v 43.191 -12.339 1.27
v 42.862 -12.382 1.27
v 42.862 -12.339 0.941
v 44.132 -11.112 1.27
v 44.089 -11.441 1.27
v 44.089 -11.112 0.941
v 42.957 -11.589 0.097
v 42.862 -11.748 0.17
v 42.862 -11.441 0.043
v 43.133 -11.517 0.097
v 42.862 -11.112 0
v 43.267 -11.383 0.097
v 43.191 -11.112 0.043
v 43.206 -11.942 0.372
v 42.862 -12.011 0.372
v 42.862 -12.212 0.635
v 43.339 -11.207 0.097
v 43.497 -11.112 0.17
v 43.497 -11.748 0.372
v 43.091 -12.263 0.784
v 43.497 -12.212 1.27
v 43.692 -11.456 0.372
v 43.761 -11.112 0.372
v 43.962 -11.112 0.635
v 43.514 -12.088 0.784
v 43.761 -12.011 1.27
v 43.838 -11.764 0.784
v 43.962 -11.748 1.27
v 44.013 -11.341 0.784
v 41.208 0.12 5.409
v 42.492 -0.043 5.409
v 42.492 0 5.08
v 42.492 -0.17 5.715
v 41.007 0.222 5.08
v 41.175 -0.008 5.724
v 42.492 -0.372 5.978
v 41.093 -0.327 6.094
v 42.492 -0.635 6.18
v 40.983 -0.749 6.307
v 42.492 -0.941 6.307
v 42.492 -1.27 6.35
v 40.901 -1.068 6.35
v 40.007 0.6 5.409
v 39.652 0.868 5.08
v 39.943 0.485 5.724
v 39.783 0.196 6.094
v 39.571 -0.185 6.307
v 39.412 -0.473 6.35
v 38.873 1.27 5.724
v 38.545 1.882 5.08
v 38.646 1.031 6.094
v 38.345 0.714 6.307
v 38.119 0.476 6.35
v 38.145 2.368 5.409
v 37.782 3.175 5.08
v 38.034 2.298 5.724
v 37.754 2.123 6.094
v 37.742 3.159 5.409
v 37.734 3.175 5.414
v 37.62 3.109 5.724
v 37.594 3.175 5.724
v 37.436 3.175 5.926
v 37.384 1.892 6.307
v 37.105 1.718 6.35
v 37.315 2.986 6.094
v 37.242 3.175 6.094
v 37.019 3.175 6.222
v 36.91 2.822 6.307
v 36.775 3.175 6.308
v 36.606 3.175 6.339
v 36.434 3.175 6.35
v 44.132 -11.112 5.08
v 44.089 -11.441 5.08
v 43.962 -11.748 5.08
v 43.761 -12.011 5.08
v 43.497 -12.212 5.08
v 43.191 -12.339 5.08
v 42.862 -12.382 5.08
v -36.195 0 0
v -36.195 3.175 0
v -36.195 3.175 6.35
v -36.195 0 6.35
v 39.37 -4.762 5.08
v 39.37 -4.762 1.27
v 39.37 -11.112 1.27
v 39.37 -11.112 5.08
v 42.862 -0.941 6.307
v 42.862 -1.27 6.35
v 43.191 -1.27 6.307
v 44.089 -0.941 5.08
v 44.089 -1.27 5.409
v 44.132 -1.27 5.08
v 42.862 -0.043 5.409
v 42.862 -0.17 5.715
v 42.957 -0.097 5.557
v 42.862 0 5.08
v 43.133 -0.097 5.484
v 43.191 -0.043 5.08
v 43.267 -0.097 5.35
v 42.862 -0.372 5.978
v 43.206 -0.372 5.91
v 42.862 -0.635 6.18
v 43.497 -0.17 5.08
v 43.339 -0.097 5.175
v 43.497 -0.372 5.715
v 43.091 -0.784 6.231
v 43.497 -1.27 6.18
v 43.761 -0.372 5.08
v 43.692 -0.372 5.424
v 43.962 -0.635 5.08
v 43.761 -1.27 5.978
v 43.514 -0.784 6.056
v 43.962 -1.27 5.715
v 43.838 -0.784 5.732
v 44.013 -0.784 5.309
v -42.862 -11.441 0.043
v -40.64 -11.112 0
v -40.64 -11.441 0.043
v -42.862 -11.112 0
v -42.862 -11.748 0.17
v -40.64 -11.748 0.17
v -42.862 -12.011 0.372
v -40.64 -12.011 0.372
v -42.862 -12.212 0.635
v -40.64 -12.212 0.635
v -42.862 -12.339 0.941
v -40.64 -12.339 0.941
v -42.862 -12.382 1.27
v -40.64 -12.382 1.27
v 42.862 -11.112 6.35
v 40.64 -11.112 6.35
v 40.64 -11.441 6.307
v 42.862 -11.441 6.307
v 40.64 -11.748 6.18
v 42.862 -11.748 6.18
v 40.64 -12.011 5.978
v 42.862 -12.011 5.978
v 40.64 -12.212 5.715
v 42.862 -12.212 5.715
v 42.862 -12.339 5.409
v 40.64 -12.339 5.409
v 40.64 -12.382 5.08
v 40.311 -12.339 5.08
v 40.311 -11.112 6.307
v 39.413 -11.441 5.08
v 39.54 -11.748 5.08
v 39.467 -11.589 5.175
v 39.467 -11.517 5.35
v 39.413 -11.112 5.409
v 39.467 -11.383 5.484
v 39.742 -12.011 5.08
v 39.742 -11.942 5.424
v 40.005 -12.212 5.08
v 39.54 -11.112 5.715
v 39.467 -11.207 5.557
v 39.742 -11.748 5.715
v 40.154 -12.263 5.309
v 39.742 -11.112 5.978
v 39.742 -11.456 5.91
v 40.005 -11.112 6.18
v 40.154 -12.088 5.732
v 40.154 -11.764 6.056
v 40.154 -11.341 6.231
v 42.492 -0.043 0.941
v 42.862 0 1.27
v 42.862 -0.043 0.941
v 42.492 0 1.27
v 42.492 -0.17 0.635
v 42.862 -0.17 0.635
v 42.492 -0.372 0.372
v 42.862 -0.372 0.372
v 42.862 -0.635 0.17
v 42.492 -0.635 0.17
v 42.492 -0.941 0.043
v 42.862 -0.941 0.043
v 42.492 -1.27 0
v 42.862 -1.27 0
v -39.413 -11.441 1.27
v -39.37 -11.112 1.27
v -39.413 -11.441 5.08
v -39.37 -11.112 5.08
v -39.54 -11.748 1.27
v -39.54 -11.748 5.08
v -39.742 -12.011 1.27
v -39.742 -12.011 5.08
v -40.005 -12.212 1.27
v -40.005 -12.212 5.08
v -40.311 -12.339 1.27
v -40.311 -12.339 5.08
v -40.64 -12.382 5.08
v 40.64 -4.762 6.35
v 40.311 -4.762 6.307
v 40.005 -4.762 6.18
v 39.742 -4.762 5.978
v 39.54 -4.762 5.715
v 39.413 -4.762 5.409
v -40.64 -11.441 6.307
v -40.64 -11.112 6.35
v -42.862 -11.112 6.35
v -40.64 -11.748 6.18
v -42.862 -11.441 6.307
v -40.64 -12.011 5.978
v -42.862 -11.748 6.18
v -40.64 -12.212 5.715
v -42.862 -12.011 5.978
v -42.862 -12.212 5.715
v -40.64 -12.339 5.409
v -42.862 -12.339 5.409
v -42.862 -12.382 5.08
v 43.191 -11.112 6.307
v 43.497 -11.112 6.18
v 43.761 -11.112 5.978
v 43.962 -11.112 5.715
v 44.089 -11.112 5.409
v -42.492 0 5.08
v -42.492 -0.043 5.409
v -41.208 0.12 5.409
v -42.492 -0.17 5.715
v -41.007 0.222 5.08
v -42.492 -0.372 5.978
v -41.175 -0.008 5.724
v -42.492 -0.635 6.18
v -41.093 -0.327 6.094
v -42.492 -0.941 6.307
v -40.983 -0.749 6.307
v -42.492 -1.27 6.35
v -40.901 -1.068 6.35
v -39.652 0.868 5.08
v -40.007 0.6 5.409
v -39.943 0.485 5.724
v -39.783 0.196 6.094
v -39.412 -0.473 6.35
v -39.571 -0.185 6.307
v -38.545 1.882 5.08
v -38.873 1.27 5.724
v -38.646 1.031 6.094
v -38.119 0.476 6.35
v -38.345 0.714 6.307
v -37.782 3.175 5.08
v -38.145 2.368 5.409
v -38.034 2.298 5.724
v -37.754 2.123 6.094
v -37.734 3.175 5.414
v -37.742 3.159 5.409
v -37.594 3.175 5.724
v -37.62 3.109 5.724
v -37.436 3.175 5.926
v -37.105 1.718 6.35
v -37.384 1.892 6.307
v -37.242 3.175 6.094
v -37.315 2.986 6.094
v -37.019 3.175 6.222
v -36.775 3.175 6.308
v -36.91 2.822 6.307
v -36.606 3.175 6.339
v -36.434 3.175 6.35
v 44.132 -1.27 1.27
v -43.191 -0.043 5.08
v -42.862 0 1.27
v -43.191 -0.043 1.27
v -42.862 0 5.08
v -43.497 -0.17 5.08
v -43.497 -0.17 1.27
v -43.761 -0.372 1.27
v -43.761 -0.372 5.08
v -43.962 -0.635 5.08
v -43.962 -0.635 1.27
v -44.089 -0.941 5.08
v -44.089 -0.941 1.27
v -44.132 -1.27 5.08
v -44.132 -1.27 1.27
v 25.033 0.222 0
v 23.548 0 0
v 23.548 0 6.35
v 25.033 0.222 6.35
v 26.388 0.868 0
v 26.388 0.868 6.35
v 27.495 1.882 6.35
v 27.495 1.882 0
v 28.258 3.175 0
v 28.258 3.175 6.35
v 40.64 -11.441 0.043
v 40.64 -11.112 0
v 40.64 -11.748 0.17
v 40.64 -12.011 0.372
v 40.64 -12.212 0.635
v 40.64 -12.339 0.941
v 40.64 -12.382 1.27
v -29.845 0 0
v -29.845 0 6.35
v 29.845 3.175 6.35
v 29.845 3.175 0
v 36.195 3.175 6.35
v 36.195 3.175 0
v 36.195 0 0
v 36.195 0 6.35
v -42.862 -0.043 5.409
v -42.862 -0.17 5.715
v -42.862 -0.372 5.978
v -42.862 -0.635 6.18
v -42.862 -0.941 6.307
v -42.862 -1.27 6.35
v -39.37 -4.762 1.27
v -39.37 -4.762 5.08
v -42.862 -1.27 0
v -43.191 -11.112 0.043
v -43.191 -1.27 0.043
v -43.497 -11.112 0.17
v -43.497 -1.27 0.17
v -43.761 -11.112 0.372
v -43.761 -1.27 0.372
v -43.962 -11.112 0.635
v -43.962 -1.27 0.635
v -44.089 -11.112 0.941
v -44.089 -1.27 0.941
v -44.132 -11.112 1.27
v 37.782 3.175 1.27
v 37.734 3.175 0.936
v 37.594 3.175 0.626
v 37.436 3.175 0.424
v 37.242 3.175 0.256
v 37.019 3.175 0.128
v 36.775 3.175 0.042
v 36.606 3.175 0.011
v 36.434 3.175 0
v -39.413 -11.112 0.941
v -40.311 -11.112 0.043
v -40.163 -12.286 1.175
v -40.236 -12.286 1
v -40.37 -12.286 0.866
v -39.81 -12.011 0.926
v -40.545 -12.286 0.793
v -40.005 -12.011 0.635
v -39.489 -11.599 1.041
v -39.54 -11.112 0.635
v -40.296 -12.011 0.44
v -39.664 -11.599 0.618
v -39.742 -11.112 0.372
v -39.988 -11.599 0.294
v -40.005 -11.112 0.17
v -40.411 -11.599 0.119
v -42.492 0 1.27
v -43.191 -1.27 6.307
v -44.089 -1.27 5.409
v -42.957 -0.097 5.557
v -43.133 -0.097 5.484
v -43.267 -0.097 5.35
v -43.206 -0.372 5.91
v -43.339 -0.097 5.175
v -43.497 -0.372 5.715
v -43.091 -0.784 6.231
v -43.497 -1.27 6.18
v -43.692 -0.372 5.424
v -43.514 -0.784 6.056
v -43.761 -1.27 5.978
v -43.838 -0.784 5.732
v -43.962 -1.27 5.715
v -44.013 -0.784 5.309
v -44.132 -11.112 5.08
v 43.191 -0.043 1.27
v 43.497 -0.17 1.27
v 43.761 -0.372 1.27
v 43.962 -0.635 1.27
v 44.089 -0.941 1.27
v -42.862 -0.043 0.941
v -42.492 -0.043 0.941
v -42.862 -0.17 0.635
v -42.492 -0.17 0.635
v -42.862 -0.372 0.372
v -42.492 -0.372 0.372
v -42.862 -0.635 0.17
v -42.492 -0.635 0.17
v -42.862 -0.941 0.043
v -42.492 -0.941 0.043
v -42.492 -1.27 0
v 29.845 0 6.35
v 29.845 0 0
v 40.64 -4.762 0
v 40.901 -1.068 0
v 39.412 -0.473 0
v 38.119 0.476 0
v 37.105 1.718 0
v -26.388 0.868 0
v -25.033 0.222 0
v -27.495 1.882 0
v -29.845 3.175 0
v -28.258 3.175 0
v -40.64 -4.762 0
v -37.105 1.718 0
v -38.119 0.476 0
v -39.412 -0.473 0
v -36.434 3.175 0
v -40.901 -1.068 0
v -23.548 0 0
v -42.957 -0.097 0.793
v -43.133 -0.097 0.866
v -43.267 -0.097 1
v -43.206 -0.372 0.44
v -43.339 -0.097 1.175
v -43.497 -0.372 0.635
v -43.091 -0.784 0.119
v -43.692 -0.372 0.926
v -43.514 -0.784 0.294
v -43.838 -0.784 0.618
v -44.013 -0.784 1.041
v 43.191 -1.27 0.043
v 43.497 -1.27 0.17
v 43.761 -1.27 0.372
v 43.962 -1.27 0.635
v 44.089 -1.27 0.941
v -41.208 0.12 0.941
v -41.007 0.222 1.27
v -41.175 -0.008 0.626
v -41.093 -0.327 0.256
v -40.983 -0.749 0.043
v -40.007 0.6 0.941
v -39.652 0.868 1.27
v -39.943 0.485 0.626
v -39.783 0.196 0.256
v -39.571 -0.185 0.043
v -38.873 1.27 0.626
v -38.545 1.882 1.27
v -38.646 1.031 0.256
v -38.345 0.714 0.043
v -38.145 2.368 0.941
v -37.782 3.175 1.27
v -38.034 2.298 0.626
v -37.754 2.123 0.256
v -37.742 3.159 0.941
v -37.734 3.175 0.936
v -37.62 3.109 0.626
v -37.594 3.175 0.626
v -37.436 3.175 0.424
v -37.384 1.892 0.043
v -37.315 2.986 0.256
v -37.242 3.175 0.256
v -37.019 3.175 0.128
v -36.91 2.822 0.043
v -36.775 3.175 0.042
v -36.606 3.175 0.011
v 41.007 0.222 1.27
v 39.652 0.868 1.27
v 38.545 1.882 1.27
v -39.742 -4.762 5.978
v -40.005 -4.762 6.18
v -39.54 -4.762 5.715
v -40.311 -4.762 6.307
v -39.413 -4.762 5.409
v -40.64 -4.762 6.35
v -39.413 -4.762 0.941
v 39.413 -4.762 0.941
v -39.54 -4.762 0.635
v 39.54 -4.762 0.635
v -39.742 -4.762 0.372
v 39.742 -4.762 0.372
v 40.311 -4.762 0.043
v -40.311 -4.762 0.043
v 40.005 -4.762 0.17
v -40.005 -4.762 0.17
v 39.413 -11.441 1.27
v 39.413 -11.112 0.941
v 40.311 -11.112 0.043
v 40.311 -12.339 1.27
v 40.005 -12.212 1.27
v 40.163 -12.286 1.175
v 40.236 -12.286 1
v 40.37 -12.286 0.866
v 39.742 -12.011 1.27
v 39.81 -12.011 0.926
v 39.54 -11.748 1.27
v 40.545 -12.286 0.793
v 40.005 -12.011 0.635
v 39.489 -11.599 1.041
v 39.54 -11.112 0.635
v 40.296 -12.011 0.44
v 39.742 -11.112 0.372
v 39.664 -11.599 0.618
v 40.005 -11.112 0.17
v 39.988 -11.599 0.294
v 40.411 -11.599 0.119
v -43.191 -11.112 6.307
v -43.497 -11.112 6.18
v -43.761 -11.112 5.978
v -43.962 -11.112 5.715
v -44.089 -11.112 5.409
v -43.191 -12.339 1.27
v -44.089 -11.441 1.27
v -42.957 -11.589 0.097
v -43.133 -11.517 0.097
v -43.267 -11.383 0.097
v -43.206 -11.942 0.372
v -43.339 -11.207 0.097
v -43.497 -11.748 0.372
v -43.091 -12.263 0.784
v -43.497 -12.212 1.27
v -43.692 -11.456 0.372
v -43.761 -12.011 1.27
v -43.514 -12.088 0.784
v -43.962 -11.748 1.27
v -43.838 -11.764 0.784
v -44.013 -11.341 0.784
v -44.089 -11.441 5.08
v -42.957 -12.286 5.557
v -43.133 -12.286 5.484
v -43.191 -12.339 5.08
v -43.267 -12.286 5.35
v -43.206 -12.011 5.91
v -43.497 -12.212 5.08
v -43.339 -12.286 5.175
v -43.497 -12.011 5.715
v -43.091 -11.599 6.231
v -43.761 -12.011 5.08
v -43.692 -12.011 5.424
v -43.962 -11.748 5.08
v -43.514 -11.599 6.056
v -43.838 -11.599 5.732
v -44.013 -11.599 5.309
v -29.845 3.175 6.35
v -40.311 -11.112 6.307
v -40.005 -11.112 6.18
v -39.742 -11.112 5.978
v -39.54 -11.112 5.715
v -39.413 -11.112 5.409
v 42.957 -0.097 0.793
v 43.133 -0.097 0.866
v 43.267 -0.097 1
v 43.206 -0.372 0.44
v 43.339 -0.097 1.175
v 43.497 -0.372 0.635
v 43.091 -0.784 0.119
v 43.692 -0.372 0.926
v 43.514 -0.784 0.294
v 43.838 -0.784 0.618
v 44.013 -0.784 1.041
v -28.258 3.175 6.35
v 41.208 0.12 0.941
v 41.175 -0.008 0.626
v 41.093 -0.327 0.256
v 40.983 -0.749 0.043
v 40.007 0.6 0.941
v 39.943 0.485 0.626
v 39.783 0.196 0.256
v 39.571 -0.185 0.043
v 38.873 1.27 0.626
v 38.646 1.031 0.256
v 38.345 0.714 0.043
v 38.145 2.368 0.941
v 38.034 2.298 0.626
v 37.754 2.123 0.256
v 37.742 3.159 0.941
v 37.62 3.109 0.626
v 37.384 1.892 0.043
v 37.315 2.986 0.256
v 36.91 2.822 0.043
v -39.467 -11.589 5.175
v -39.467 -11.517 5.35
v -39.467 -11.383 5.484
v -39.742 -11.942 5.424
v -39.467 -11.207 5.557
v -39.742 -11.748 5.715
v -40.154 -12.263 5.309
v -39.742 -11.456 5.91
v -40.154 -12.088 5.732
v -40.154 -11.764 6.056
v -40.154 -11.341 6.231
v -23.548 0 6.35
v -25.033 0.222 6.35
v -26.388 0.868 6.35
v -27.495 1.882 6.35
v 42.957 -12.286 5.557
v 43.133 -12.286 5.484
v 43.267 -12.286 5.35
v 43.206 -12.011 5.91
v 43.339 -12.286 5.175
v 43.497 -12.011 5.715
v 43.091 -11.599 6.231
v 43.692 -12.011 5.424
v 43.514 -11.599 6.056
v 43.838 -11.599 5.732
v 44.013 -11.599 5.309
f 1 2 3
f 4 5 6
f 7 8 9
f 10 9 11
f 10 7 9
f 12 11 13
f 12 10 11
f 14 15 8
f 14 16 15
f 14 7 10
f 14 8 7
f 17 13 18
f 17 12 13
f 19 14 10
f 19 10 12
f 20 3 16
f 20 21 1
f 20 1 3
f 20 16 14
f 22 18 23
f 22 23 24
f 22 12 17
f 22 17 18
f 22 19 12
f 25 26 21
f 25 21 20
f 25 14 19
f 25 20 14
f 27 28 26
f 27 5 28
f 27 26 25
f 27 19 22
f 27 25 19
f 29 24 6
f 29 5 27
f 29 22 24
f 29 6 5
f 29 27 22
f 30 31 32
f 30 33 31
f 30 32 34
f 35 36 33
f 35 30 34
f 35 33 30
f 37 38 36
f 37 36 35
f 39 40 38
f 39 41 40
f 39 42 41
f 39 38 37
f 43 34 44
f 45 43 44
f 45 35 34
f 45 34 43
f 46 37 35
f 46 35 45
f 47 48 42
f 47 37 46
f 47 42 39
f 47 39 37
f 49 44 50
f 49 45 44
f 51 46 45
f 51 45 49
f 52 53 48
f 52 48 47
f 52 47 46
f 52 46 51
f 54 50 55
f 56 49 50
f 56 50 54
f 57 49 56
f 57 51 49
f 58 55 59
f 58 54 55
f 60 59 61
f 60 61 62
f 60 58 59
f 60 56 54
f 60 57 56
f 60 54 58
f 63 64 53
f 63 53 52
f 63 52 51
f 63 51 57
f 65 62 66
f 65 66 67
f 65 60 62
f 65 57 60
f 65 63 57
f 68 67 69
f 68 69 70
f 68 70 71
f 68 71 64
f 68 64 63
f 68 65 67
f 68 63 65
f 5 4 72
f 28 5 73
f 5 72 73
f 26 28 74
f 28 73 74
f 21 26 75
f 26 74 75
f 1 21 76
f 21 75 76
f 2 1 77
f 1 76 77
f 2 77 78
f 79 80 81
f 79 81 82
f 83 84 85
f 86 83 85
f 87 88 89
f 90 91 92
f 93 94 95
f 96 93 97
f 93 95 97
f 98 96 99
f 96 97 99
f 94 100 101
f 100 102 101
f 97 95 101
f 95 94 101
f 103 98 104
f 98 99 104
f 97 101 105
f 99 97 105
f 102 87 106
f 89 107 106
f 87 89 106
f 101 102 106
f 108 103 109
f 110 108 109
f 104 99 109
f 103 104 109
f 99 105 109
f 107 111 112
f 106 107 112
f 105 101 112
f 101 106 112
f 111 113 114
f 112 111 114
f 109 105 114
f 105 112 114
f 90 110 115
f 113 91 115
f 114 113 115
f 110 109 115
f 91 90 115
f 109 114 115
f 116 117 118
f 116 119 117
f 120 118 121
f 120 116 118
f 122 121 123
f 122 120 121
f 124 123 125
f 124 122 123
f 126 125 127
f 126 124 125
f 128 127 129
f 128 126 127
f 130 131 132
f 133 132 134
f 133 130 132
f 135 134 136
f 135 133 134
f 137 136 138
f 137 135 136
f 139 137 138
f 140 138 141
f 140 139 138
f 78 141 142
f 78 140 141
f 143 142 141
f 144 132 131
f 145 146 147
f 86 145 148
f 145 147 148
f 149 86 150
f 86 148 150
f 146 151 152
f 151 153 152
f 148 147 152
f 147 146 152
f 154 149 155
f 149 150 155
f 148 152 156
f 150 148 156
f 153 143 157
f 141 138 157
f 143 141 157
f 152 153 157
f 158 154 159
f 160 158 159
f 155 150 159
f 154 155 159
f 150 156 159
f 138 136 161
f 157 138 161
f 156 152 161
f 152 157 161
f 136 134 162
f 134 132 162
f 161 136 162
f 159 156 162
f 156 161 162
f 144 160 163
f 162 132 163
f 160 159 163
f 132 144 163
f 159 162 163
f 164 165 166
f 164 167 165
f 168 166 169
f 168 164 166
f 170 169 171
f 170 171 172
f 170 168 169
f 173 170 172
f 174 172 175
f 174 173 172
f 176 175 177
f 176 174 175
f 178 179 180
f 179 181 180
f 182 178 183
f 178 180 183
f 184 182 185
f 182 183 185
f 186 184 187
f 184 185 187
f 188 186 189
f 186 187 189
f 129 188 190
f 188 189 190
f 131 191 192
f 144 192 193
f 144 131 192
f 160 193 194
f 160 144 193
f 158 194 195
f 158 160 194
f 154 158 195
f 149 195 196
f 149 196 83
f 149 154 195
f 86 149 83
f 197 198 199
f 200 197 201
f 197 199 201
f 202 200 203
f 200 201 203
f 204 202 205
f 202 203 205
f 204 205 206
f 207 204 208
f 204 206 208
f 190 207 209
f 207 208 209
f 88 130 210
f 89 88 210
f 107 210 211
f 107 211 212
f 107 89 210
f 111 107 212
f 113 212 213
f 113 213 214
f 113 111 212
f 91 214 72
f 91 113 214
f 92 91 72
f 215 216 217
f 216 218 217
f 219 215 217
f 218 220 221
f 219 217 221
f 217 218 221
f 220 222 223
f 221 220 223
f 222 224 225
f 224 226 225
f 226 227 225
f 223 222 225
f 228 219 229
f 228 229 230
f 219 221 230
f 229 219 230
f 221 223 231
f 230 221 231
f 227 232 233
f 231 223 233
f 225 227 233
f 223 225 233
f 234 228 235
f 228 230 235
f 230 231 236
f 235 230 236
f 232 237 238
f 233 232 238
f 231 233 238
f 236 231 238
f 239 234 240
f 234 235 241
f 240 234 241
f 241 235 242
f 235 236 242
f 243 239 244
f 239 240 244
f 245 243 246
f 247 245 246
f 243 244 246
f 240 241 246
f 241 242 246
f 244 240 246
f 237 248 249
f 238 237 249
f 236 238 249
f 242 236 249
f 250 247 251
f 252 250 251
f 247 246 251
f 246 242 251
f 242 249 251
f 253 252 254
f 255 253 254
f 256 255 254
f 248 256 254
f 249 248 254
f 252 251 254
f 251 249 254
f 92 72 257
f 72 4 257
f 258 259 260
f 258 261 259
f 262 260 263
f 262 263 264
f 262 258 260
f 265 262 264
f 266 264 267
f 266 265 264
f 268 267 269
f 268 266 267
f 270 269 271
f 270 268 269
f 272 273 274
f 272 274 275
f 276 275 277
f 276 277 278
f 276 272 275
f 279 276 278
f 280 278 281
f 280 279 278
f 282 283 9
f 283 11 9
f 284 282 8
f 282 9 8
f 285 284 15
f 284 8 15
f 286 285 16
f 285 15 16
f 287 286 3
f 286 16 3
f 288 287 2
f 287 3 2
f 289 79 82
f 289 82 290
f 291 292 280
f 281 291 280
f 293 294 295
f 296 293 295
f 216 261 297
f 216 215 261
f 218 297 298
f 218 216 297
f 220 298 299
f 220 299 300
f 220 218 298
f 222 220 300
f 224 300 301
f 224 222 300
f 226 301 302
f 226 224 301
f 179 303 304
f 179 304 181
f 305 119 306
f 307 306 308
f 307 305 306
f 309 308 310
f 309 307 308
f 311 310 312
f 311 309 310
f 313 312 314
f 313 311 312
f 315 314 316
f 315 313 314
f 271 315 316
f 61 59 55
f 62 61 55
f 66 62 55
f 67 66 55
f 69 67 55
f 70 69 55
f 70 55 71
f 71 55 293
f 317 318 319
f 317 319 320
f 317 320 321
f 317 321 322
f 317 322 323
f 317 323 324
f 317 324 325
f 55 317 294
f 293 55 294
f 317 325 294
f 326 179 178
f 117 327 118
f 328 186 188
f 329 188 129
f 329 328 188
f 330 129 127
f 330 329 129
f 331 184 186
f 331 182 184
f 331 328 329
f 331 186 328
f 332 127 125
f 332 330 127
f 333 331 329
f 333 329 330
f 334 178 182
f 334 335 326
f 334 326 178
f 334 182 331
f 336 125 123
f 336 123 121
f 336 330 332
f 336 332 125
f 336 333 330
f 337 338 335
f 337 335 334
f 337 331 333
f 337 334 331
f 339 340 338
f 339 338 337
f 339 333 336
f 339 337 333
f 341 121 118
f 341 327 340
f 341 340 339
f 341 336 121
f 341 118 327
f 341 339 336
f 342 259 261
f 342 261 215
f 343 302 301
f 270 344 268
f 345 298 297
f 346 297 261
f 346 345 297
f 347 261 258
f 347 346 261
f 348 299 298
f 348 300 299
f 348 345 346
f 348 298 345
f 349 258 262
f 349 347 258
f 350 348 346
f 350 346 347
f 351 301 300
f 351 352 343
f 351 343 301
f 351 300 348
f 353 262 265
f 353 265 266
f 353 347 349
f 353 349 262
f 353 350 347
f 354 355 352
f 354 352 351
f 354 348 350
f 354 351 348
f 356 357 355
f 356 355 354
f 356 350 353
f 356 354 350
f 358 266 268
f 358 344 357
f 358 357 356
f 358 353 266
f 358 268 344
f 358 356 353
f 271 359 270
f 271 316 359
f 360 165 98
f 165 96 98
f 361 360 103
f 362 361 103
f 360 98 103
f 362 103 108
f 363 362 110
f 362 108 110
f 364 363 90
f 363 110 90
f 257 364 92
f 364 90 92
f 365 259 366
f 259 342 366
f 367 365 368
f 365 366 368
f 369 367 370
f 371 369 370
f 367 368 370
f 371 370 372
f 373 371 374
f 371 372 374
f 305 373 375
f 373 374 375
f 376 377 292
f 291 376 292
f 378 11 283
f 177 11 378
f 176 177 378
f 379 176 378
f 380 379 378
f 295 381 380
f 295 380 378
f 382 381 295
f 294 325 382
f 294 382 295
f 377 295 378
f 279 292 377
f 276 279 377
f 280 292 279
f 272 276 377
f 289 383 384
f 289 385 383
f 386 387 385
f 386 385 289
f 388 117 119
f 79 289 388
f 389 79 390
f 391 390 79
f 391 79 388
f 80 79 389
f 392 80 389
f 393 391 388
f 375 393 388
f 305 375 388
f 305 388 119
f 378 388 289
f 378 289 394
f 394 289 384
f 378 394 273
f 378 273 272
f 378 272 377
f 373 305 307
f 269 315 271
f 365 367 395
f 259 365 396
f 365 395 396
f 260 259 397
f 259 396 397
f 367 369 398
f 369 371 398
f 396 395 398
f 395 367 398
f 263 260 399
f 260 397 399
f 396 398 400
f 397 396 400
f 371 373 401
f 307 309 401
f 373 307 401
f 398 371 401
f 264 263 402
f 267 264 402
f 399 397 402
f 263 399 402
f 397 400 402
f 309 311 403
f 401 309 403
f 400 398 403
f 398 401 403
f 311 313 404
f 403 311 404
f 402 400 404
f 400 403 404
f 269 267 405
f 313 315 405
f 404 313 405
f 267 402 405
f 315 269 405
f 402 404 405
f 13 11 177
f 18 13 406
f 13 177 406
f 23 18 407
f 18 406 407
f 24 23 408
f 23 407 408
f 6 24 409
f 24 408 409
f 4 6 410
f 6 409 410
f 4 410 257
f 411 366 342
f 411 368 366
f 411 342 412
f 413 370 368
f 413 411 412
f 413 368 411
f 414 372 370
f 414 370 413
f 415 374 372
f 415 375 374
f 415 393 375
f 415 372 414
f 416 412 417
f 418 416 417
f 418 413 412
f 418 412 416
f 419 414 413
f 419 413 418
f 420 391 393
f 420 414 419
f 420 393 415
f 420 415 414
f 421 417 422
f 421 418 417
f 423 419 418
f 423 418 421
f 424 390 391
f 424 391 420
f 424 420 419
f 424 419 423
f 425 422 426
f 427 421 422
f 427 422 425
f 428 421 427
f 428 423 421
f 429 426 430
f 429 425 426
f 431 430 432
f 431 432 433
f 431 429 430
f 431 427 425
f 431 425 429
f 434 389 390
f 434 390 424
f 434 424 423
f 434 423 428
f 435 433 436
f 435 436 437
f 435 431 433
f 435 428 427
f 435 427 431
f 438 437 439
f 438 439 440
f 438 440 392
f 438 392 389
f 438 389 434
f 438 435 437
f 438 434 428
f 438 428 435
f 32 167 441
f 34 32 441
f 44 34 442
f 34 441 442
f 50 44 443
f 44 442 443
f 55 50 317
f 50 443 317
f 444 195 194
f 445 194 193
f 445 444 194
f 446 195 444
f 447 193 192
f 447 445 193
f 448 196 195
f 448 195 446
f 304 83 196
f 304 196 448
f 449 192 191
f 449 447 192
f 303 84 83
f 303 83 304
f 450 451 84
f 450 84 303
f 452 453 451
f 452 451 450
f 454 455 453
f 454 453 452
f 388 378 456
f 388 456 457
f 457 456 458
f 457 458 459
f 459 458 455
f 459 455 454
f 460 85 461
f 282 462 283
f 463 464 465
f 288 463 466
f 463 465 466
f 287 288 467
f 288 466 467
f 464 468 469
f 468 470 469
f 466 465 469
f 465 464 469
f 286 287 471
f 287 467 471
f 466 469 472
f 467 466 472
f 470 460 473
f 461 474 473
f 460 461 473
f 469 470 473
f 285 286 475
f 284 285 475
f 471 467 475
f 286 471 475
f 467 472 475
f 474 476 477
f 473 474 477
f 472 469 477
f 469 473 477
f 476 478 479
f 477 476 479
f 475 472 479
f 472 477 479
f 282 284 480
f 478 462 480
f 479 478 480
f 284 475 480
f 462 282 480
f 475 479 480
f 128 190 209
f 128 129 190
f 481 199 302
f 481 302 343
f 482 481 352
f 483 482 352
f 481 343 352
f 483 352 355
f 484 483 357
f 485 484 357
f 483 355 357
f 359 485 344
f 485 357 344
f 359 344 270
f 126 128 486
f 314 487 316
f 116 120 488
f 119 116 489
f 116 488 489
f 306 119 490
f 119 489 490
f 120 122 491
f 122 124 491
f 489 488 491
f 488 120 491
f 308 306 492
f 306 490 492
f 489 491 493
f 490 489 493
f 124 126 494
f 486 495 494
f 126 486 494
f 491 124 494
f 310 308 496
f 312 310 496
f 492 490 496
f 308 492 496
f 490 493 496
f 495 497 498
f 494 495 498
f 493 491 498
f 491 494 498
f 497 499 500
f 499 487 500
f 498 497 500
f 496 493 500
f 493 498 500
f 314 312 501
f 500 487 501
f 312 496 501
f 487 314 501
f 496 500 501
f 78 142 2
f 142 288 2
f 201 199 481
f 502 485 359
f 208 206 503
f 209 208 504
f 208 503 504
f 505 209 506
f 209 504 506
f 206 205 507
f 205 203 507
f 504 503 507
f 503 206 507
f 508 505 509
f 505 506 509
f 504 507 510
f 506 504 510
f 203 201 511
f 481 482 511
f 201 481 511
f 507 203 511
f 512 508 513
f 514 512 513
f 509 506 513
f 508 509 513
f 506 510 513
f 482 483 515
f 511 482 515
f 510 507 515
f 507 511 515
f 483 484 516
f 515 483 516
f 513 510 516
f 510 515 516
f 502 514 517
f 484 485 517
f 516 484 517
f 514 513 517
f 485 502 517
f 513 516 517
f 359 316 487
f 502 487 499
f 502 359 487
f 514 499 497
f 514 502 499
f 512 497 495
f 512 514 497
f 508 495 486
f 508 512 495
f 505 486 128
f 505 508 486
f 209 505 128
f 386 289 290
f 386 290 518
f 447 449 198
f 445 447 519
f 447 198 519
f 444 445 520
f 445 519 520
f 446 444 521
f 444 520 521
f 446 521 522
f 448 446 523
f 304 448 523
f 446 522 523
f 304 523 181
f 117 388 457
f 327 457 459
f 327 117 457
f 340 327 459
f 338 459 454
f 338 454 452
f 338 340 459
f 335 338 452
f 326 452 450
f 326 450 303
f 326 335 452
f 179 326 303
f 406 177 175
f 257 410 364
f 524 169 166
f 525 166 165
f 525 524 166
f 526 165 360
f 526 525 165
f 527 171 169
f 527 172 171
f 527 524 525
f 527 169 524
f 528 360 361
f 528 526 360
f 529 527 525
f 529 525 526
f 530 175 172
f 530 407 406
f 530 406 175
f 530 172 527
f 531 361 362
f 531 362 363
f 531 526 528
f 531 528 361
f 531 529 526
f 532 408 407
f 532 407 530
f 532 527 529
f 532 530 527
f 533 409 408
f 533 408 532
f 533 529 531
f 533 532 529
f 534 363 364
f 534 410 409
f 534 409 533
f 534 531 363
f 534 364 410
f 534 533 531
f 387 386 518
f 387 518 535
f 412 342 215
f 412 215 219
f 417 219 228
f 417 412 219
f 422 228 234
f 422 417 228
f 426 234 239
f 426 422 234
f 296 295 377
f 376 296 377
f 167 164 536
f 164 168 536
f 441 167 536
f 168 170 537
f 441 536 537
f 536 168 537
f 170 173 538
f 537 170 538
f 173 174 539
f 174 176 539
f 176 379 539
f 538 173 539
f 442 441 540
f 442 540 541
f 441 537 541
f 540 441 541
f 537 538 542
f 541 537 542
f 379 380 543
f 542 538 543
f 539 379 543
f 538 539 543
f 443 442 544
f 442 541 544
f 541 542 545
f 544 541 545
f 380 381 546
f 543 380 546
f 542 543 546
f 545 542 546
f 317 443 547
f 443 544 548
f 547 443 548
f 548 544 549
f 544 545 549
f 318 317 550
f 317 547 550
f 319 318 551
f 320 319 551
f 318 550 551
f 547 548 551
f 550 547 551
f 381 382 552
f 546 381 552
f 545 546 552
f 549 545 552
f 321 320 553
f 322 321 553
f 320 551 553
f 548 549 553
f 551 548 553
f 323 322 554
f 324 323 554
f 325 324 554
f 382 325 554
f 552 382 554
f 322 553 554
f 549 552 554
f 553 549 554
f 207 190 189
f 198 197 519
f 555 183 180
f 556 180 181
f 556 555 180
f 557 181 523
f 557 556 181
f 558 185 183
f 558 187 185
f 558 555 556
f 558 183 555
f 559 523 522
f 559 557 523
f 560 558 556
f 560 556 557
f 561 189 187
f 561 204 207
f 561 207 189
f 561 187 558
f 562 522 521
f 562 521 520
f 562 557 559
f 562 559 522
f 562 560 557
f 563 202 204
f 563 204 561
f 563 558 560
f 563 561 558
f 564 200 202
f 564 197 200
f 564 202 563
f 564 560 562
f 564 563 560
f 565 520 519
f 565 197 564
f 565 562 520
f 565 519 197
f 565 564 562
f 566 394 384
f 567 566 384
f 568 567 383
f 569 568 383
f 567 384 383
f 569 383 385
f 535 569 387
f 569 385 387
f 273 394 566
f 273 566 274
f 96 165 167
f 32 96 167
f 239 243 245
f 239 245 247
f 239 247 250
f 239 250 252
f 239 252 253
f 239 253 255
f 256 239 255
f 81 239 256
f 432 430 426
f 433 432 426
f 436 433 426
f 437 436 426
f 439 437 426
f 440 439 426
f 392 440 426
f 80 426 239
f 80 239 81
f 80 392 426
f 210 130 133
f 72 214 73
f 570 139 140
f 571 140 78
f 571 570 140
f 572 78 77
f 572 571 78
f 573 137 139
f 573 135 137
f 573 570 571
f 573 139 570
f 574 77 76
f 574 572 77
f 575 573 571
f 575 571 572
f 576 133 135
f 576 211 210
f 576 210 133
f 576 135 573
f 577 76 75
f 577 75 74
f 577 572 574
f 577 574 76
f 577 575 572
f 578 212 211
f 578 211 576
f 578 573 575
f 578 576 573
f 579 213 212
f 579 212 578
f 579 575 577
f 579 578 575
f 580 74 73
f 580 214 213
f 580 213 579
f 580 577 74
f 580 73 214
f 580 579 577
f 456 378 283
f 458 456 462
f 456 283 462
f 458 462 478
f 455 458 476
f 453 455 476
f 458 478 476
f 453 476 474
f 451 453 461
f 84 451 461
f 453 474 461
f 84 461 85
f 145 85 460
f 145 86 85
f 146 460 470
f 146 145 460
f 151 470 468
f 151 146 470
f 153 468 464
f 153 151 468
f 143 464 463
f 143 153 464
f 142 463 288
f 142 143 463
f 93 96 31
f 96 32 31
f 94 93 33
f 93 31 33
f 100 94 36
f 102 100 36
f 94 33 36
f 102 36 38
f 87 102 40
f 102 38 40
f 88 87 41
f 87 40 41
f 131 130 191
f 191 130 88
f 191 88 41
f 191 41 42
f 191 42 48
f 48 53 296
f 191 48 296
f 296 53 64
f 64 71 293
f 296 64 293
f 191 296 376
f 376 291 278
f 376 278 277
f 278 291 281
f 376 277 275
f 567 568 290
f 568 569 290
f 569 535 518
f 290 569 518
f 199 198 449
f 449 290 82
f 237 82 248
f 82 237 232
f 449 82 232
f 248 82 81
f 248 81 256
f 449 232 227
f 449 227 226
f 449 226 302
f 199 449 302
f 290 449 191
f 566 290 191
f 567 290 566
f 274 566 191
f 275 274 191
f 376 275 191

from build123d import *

# Parameters (mm, degrees)
F1_DEPTH    = 6.35
F2_T1_DEPTH = 6.35
F3_R        = 1.27


# Not quite as in the source:
# - a fillet or chamfer that OpenCascade refuses, or shapes differently, is made with other operations: its cross-section is extruded or revolved along the edge and cut away or added


with BuildPart() as f1:
    # F0 (on Top) → F1 (new body)
    with BuildSketch(Plane.XY):
        Polygon((28.2575, 0), (0, 0), (0, -4.7625), (39.37, -4.7625), (39.37, -12.3825), (44.1325, -12.3825), (44.1325, 0), (37.7825, 0), (37.7825, 3.175), (36.195, 3.175), (36.195, 0), (29.845, 0), (29.845, 3.175), (28.2575, 3.175), align=None)
    extrude(amount=F1_DEPTH)

    # F2: fillet of radius 5.08 on 2 edges, made by hand

    # F2_s2 → F2_t1 (join)
    with BuildSketch(Plane.XY):
        with BuildLine():
            ThreePointArc((42.4917860393, 0), (39.6519797079, 0.8678865162), (37.7825, 3.175))
            Line((37.7825, 3.175), (37.7825, 0))
            Line((37.7825, 0), (42.4917860393, 0))
        make_face()
        with BuildLine():
            ThreePointArc((23.5482139607, 0), (26.3880202921, 0.8678865162), (28.2575, 3.175))
            Line((28.2575, 3.175), (28.2575, 0))
            Line((28.2575, 0), (23.5482139607, 0))
        make_face()
    extrude(amount=F2_T1_DEPTH)

    # F3
    f3_edges = [f1.edges().sort_by_distance(p)[0] for p in [
        (39.37, -8.5725, 0),
        (44.1325, -6.19125, 6.35),
        (41.75125, -12.3825, 6.35),
        (44.1325, -12.3825, 3.175),
        (39.37, -12.3825, 3.175),
        (41.75125, -12.3825, 0),
        (39.37, -8.5725, 6.35),
        (44.1325, -6.19125, 0),
        (39.65198, 0.867887, 6.35),
        (39.65198, 0.867887, 0),
        (43.312143, 0, 6.35),
        (43.312143, 0, 0),
        (44.1325, 0, 3.175),
    ]]
    fillet(f3_edges, radius=F3_R)

    # F4: F1 across plane


with BuildPart() as f1_1:
    add(f1.part)
    add(f1.part.mirror(Plane.YZ))


solid = f1_1.part
